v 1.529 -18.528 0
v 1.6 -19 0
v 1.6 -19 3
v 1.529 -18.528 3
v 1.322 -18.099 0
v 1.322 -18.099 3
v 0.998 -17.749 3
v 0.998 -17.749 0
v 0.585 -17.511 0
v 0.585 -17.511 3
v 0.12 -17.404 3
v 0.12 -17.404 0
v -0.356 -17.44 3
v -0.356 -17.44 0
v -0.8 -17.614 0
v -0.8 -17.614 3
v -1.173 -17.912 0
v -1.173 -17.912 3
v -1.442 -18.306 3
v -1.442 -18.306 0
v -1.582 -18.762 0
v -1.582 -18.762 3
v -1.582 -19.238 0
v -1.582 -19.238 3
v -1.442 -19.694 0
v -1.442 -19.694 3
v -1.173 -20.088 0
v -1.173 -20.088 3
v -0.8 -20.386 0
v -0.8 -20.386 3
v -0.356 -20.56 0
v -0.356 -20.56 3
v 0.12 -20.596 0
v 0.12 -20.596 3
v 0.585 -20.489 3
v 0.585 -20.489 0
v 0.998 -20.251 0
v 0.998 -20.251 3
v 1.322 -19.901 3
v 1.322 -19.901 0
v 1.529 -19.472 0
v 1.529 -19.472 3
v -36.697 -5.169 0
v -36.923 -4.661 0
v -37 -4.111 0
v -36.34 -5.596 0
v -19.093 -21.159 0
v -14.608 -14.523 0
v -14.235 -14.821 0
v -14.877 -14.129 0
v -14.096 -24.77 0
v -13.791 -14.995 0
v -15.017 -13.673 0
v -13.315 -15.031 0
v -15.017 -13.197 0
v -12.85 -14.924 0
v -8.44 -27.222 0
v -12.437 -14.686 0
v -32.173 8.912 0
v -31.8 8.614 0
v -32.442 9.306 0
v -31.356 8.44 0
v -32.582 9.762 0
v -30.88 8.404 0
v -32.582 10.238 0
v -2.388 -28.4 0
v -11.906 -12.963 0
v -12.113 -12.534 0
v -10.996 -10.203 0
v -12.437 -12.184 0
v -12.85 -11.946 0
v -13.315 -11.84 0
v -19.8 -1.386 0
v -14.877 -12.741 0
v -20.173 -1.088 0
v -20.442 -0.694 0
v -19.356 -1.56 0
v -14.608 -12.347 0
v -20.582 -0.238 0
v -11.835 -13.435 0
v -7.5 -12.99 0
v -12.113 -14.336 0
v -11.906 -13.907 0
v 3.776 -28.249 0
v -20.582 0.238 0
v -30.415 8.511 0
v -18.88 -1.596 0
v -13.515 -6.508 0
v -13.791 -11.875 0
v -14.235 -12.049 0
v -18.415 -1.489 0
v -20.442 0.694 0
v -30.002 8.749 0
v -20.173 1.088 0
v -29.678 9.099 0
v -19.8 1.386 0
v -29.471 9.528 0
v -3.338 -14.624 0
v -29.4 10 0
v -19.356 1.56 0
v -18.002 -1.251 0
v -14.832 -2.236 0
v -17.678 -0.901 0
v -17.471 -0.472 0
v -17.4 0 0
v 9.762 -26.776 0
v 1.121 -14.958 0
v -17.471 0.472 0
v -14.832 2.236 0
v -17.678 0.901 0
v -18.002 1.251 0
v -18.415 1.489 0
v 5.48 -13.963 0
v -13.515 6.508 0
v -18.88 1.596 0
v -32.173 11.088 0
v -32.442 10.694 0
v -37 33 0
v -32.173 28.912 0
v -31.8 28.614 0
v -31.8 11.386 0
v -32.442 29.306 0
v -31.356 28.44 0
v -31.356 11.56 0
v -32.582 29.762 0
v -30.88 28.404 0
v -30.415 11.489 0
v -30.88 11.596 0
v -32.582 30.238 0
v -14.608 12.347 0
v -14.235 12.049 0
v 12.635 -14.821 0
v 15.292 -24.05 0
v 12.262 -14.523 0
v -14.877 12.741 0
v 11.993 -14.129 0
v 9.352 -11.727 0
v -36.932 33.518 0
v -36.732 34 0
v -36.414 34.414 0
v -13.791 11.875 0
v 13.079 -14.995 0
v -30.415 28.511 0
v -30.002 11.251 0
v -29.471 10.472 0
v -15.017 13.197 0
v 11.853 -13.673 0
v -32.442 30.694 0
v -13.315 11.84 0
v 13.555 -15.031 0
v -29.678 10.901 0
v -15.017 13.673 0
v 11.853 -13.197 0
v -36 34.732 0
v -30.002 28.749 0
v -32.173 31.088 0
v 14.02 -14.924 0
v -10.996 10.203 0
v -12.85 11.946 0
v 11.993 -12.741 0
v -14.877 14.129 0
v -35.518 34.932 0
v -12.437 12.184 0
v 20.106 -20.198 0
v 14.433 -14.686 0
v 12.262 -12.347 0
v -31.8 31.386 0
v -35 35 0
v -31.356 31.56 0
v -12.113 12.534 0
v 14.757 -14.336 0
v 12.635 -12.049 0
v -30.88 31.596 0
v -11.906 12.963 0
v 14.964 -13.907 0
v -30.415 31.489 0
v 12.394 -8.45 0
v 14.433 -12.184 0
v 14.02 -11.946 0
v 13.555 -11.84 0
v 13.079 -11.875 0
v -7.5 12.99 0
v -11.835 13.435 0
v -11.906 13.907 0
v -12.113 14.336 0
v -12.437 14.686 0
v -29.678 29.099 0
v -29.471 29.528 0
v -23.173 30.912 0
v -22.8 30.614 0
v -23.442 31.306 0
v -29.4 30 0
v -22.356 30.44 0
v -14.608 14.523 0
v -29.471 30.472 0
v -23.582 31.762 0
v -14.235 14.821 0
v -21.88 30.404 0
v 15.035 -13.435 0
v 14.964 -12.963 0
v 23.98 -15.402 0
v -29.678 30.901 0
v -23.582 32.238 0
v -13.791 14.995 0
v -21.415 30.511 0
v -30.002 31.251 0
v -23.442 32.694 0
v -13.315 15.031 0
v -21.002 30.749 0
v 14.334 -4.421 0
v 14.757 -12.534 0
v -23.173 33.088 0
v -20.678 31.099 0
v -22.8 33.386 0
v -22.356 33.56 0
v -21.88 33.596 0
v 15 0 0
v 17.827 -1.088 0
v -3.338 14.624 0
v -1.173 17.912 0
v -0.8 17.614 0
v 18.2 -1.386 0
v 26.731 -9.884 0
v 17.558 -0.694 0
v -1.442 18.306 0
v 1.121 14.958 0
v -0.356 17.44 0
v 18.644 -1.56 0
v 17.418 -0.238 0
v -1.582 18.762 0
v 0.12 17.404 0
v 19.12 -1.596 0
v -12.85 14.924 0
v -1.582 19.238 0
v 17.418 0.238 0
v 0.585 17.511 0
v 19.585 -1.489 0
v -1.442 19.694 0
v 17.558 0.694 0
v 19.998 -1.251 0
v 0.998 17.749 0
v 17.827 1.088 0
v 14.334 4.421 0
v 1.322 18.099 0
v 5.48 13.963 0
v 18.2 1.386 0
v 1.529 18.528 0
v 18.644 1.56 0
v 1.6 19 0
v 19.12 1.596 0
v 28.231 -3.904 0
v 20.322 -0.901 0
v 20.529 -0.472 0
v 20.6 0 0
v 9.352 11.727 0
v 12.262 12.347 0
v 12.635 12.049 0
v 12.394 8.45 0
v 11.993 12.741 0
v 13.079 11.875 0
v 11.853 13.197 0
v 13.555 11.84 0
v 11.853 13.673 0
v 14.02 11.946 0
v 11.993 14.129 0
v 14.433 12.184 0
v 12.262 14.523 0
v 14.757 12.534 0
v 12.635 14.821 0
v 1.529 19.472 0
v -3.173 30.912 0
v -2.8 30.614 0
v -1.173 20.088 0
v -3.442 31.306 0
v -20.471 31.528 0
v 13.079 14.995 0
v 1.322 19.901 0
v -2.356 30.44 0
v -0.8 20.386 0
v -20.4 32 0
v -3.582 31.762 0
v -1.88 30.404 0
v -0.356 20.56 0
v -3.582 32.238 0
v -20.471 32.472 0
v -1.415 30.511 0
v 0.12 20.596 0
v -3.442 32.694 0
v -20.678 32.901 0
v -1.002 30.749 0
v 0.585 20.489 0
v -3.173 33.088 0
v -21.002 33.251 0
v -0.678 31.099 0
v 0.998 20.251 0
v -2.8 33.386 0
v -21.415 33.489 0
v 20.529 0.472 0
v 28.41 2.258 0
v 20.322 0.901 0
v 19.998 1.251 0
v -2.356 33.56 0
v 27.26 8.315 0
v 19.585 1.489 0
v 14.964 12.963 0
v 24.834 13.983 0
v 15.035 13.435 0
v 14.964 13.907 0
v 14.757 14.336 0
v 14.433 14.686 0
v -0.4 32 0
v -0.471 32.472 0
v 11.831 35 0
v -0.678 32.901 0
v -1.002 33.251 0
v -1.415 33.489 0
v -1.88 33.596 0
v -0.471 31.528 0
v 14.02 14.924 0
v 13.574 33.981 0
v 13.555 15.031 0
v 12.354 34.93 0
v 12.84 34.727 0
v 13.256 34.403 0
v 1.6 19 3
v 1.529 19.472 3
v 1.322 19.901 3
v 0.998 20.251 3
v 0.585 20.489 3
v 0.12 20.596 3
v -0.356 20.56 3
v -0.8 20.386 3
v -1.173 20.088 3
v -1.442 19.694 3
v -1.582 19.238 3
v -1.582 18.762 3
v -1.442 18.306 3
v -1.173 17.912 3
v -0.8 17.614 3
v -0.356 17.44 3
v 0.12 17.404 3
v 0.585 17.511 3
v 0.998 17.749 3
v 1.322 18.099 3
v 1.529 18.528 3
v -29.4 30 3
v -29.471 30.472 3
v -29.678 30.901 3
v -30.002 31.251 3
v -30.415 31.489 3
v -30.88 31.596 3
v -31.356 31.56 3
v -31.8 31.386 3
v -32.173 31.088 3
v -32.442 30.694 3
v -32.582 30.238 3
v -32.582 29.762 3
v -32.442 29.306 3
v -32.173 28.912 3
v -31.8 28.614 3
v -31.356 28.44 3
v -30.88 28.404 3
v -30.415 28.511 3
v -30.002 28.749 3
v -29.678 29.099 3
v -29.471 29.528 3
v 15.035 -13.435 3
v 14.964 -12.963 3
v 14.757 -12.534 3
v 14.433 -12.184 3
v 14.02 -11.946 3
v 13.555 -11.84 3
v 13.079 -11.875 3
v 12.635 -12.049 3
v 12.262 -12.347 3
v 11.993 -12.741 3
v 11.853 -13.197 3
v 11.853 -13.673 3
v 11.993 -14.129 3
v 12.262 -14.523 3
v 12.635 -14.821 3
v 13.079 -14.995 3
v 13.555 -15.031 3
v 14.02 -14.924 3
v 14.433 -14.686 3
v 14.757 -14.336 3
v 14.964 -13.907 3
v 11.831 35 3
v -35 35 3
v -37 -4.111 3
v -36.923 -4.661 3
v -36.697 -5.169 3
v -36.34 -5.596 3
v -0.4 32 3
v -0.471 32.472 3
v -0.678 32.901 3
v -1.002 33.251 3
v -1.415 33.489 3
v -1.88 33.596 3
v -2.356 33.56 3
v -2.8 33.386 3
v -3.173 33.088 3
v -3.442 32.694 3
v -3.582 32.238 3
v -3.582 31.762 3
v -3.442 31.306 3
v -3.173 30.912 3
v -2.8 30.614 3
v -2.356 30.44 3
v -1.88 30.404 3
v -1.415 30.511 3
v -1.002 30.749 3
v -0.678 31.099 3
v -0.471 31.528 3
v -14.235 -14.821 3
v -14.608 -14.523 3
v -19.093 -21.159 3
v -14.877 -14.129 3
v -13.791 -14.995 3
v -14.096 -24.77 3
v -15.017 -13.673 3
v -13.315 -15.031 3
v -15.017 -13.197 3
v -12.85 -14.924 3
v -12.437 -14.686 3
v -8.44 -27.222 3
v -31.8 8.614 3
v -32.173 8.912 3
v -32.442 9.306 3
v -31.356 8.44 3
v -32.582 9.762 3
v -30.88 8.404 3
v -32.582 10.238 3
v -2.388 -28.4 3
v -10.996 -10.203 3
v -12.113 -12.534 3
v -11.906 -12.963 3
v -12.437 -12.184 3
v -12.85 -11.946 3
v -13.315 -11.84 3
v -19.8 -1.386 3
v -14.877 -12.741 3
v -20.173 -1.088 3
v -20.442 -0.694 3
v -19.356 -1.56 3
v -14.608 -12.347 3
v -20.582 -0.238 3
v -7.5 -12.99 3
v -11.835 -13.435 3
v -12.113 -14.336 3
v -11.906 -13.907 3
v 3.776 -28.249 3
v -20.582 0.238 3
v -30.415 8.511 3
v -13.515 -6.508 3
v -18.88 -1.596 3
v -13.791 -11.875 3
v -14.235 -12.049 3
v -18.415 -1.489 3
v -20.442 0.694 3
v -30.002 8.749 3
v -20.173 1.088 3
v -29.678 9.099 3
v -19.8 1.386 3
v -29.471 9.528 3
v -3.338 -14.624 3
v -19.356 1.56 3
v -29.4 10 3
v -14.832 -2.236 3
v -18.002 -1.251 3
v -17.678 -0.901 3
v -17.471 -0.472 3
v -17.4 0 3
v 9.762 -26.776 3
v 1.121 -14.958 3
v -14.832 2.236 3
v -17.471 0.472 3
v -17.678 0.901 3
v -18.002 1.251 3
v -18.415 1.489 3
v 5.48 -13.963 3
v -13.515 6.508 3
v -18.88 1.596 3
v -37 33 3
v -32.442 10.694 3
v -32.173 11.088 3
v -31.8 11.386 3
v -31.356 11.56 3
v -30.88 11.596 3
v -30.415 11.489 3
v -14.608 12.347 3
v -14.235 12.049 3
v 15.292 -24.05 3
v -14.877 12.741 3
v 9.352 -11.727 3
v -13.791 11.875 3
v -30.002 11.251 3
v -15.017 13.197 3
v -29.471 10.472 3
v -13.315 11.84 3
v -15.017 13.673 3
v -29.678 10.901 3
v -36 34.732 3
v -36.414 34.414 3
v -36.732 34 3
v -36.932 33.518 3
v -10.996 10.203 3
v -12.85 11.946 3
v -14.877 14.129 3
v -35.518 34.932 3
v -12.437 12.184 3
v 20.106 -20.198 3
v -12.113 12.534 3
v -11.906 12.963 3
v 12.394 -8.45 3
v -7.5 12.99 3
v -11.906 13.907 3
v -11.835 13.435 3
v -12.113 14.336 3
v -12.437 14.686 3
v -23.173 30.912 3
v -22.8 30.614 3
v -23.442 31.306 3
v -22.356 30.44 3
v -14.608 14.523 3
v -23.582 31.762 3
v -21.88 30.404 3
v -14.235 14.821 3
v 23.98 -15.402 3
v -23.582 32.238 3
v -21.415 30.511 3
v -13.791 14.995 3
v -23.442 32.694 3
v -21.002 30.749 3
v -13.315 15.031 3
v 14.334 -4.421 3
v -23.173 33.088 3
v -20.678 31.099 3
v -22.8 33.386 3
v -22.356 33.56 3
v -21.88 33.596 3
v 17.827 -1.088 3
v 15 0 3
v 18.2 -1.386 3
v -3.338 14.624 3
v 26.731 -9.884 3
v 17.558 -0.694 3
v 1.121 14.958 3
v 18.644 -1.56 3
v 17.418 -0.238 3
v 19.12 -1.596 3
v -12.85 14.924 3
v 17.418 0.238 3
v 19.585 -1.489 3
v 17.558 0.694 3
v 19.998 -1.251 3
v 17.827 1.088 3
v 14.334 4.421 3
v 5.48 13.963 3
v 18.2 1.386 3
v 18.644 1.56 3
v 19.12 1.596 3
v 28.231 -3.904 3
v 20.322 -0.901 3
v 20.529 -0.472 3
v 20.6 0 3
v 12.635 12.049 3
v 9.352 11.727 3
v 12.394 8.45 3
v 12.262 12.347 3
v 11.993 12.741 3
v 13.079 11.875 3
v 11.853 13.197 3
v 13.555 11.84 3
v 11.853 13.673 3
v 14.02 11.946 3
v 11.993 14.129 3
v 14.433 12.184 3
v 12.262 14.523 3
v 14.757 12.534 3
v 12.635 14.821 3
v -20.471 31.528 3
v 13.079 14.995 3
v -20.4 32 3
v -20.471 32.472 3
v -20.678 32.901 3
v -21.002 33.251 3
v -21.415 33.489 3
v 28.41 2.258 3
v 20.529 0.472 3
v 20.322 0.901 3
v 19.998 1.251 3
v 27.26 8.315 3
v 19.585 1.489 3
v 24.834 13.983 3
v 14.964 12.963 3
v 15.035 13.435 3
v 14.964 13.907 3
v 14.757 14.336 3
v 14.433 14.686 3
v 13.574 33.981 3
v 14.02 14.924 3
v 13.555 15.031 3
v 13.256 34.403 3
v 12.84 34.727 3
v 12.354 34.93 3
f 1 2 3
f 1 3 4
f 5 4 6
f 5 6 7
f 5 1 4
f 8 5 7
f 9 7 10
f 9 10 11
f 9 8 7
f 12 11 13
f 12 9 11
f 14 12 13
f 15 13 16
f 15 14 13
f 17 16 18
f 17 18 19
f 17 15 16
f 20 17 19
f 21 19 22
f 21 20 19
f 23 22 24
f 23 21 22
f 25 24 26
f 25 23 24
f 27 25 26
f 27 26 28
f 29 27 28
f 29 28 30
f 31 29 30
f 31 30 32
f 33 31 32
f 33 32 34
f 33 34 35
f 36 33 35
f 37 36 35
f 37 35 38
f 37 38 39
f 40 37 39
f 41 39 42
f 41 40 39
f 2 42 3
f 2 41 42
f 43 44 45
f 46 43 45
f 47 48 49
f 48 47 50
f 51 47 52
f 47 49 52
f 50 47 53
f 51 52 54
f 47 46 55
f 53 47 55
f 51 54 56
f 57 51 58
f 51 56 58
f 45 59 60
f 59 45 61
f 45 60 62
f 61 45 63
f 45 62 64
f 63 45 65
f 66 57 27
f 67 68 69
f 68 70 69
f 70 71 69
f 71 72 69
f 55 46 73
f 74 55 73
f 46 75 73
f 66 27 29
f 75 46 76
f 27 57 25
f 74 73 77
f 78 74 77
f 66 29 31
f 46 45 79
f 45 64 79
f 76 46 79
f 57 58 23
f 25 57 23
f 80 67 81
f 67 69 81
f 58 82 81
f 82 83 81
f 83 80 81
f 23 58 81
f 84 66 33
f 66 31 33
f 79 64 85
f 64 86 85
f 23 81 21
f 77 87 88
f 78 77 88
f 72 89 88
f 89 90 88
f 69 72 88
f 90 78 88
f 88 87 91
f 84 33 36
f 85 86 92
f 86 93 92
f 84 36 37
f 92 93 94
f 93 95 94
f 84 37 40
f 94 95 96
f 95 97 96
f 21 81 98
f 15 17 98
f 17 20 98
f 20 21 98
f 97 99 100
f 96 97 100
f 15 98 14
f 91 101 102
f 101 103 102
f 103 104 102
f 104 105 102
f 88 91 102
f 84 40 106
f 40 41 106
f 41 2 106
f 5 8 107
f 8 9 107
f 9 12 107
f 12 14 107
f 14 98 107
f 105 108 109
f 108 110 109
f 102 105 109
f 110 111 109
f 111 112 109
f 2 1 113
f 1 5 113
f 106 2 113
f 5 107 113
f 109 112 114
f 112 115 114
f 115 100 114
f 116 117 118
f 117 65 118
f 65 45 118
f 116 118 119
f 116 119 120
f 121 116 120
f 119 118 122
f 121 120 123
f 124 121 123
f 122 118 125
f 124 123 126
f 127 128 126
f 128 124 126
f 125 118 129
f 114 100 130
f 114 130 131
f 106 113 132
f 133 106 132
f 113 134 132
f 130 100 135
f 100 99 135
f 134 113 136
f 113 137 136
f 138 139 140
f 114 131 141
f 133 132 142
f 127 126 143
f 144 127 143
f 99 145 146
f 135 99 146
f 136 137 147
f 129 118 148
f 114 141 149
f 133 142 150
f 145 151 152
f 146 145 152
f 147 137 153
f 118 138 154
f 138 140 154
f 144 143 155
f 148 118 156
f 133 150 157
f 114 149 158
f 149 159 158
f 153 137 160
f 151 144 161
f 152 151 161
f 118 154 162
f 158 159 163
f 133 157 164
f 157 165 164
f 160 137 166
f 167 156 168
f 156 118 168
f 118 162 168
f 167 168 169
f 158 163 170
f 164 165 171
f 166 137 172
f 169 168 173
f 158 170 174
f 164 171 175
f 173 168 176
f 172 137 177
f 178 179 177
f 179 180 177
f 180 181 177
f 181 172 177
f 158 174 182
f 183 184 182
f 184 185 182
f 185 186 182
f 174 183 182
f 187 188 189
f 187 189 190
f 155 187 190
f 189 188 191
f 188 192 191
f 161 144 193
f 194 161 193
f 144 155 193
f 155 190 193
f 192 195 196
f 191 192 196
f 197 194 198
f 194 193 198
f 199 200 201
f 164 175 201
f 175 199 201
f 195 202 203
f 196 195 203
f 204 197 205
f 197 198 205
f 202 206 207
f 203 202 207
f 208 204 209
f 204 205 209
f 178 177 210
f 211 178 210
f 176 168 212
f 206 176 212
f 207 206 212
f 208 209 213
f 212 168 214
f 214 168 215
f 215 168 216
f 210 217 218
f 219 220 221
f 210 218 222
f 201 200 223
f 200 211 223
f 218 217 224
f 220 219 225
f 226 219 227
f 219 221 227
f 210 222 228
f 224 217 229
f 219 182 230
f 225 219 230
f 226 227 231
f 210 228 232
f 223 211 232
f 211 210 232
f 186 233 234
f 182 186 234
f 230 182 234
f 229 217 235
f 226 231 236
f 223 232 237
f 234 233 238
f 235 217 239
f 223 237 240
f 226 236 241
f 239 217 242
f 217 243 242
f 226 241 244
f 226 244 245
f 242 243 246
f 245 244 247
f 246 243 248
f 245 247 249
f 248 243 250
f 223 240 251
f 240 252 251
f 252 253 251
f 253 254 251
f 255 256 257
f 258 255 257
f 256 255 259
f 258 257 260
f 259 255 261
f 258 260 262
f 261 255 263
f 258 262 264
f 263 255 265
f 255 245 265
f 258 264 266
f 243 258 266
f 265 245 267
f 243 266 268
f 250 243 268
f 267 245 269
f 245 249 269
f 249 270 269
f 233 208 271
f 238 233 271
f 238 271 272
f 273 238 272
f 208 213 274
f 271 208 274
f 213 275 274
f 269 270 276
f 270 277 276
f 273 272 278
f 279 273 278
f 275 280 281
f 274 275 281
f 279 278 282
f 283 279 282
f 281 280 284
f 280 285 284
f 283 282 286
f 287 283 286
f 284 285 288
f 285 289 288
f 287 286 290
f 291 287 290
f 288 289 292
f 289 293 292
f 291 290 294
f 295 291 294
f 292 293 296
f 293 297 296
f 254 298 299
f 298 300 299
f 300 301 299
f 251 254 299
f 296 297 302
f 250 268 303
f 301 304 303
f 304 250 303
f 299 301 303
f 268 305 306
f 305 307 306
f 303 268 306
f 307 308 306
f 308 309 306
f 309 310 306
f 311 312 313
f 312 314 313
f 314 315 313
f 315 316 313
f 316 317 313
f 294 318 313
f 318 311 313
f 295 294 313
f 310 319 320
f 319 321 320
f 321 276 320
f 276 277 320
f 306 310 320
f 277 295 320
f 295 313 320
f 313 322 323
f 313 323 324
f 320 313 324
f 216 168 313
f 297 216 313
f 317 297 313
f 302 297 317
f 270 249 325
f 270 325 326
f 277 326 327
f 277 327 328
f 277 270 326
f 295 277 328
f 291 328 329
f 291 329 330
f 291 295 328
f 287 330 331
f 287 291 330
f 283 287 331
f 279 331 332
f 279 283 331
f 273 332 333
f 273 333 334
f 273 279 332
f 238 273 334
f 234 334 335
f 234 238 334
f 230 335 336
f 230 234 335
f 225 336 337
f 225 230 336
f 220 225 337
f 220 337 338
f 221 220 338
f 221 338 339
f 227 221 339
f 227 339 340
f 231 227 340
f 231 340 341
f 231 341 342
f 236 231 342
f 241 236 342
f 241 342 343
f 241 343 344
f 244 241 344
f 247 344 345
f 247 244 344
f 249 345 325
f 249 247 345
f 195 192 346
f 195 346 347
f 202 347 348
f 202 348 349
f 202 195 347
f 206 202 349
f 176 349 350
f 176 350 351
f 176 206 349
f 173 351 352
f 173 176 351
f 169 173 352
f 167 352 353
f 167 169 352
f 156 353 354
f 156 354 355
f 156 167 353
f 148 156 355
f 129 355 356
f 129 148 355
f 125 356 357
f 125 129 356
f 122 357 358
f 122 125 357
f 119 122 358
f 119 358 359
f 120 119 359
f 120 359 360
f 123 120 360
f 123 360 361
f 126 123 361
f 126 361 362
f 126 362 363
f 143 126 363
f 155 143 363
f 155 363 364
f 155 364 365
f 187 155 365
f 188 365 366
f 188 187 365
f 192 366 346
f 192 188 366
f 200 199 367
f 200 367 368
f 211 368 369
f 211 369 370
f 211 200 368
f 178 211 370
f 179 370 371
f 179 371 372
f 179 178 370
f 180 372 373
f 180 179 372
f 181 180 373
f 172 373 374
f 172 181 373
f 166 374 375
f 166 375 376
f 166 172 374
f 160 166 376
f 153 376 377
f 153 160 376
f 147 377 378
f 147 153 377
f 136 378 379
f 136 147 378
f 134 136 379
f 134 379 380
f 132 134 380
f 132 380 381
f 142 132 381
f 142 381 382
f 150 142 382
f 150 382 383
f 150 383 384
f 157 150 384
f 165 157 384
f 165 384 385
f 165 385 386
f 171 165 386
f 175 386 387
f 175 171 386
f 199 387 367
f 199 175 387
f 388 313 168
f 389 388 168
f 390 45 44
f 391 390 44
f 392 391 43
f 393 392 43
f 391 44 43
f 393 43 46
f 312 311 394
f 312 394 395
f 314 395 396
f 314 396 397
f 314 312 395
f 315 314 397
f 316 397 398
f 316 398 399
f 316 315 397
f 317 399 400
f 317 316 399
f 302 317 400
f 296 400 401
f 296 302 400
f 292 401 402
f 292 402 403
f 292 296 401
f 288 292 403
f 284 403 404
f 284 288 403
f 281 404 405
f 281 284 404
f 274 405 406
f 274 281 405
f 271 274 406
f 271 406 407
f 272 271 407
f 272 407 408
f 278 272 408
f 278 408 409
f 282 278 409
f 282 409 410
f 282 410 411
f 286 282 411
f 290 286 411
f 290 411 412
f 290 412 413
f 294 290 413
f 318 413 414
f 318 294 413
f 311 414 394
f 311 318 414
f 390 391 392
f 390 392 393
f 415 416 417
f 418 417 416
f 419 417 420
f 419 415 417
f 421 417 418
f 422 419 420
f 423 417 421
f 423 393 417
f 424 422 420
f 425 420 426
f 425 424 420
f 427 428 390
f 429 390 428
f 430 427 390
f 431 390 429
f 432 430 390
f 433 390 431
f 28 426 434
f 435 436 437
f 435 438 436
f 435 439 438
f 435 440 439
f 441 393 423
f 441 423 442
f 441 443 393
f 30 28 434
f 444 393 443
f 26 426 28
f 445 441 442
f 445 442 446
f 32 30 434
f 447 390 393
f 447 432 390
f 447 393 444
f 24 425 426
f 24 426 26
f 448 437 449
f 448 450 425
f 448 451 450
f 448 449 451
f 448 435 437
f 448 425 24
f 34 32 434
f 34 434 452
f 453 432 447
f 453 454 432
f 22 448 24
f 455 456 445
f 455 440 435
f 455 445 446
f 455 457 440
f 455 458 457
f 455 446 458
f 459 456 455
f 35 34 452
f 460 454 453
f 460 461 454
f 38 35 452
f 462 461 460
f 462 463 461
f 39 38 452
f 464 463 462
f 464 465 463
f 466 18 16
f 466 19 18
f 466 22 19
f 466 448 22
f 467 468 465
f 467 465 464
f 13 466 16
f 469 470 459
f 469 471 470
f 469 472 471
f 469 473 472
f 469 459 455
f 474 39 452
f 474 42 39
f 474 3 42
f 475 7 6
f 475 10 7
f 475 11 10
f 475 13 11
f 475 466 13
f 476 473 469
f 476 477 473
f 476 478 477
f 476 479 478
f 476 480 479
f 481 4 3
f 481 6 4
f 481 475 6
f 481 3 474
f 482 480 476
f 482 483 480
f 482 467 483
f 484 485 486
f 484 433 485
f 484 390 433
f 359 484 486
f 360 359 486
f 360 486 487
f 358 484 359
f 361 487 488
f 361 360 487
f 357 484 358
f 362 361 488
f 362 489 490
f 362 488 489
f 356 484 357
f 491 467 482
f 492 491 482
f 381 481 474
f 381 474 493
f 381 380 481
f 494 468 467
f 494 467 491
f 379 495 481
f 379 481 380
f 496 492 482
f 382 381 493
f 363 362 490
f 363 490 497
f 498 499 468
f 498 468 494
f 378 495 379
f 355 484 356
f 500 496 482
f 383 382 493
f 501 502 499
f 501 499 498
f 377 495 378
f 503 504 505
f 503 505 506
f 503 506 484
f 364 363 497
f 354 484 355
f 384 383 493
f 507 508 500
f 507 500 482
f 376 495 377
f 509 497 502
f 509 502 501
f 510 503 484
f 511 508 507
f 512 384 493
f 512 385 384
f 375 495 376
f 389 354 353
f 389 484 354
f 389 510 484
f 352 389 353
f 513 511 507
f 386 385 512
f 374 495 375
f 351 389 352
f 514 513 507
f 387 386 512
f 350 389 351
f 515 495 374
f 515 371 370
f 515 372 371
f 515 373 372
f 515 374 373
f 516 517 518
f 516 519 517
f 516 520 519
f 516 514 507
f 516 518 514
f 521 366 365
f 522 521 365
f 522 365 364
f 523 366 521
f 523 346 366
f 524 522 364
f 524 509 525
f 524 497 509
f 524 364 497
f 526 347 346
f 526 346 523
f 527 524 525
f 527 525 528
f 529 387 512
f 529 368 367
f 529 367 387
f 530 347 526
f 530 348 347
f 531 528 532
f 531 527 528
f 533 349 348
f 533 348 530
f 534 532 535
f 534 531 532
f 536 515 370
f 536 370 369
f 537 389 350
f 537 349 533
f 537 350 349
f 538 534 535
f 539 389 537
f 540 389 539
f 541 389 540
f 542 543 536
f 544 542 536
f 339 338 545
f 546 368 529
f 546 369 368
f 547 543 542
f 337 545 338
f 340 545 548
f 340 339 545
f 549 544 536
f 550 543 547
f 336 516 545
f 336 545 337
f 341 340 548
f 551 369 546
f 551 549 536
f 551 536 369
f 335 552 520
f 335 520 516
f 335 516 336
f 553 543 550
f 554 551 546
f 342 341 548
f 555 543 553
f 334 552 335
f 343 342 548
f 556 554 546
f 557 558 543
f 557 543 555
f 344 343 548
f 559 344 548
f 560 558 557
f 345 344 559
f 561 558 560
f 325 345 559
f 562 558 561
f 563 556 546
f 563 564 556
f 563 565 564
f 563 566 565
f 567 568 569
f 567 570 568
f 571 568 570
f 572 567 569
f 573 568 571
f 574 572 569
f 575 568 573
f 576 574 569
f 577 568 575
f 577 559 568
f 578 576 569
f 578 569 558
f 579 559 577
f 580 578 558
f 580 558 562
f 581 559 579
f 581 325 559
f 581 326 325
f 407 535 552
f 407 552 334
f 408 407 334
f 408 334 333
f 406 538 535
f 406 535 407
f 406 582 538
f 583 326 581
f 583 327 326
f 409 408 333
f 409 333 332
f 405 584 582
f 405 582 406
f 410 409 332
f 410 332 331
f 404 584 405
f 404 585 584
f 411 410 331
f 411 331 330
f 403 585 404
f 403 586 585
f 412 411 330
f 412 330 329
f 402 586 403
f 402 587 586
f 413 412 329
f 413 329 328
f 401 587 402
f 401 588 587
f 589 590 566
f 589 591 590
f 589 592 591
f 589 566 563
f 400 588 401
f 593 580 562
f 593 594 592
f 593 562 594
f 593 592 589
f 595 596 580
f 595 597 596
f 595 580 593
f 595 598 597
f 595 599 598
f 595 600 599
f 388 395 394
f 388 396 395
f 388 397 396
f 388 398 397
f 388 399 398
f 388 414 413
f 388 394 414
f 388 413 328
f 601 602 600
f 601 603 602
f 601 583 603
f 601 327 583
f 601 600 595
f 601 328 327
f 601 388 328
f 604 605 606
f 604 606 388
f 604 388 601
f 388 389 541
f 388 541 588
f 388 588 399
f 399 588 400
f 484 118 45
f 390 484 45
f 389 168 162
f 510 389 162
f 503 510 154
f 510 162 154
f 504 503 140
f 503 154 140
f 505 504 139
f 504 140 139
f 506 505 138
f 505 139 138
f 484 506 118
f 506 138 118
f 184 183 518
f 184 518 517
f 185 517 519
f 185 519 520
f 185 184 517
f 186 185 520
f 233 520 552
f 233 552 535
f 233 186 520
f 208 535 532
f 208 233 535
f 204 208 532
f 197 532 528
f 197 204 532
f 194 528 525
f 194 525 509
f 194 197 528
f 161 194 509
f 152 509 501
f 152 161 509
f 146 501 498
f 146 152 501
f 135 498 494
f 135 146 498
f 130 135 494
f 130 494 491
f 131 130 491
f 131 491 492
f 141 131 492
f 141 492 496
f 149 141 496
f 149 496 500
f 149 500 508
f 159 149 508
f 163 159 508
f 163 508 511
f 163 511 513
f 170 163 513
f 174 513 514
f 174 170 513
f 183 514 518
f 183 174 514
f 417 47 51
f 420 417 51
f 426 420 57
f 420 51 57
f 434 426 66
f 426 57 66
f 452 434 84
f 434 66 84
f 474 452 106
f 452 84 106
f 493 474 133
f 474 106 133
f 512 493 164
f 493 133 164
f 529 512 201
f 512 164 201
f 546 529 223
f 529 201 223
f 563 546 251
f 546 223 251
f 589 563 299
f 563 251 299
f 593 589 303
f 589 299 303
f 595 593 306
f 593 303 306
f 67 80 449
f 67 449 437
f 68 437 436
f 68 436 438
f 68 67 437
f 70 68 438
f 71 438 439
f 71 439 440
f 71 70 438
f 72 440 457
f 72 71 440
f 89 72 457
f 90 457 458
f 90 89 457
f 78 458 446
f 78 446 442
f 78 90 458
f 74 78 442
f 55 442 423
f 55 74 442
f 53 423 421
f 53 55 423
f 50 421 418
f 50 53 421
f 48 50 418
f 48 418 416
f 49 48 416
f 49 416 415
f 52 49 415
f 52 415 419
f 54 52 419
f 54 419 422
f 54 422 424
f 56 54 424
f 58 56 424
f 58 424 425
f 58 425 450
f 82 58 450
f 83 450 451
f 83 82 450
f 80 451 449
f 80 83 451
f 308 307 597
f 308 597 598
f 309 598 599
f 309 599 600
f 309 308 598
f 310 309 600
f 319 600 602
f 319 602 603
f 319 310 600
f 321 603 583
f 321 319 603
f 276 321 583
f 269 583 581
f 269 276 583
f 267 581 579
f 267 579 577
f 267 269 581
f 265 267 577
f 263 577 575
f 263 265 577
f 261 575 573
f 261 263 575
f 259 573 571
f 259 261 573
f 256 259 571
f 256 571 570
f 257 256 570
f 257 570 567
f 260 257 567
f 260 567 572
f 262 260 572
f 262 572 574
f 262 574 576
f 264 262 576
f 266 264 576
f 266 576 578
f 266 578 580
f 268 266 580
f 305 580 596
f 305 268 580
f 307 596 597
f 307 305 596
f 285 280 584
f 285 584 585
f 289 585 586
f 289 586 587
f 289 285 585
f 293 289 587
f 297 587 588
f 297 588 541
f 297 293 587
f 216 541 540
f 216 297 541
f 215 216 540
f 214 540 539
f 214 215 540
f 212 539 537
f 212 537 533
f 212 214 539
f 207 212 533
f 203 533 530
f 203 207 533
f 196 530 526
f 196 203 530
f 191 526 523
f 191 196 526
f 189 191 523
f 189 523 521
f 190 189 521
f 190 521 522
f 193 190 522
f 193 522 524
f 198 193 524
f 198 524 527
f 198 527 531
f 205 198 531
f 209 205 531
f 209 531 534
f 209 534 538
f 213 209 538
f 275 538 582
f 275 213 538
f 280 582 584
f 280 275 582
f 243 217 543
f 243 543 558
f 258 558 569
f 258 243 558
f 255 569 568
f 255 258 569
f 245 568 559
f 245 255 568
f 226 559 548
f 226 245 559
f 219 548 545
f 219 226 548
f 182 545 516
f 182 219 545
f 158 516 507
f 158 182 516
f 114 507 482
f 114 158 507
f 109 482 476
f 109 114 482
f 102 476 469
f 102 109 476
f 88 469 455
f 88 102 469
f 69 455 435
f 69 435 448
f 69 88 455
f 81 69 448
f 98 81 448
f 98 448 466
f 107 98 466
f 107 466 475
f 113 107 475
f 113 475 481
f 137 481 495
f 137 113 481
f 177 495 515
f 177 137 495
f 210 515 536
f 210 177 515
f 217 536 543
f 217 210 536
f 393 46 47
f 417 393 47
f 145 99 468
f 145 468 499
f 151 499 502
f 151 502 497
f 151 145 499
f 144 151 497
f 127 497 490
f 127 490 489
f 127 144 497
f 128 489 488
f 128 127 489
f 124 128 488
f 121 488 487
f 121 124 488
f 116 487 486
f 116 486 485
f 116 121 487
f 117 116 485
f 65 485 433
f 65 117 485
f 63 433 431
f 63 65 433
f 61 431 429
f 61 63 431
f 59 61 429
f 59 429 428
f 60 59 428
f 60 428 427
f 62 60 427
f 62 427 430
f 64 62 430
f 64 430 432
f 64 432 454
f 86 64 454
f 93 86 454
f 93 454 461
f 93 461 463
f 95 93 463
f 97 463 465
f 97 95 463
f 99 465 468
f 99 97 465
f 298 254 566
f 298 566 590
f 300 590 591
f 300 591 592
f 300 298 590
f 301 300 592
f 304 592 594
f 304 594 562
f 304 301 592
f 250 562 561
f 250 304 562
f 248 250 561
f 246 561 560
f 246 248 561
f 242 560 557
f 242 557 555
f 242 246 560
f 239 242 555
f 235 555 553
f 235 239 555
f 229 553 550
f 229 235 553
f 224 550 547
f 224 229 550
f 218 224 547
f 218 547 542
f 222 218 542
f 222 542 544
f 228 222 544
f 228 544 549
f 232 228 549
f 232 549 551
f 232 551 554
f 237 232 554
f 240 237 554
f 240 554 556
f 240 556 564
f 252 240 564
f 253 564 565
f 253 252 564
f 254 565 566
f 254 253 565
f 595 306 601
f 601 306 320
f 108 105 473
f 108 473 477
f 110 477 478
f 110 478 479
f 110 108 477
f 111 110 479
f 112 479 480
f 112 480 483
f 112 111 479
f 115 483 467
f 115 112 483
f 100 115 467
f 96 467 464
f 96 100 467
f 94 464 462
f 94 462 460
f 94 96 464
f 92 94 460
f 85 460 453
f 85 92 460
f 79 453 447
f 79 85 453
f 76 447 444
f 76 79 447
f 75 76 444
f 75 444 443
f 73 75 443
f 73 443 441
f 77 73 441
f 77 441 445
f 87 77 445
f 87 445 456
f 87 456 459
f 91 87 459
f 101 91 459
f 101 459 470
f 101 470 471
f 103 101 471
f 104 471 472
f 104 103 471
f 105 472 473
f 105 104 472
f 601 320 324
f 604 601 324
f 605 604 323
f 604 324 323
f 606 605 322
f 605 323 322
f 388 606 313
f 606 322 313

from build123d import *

# Parameters (mm, degrees)
SKETCH_2_R      = 28.5
SKETCH_2_R_2    = 15
SKETCH_2_R_3    = 1.6
EXTRUDE_1_DEPTH = 3
EXTRUDE_START   = -3
SKETCH_4_R      = 1.6
EXTRUDE_2_DEPTH = 3


with BuildPart() as part:
    # 草图2 → 凸台-拉伸1 (new body)
    with BuildSketch(Plane.XY):
        Circle(SKETCH_2_R)
        Circle(SKETCH_2_R_2, mode=Mode.SUBTRACT)
        with Locations((0, 19)):
            Circle(SKETCH_2_R_3, mode=Mode.SUBTRACT)
        with Locations((13.435028843, 13.435028843)):
            Circle(SKETCH_2_R_3, mode=Mode.SUBTRACT)
        with Locations((19, 0)):
            Circle(SKETCH_2_R_3, mode=Mode.SUBTRACT)
        with Locations((13.435028843, -13.435028843)):
            Circle(SKETCH_2_R_3, mode=Mode.SUBTRACT)
        with Locations((0, -19)):
            Circle(SKETCH_2_R_3, mode=Mode.SUBTRACT)
        with Locations((-13.435028843, -13.435028843)):
            Circle(SKETCH_2_R_3, mode=Mode.SUBTRACT)
        with Locations((-19, 0)):
            Circle(SKETCH_2_R_3, mode=Mode.SUBTRACT)
        with Locations((-13.435028843, 13.435028843)):
            Circle(SKETCH_2_R_3, mode=Mode.SUBTRACT)
    extrude(amount=EXTRUDE_1_DEPTH)

    # 草图4 → 凸台-拉伸2 (add)
    with BuildSketch(Plane.XY.offset(3).offset(EXTRUDE_START)):
        with BuildLine():
            Line((-36.339888851, -5.595677643), (-19.093416125, -21.158720677))
            ThreePointArc((-19.093416125, -21.158720677), (-17.803808855, 22.254761069), (24.833892005, 13.983125827))
            Line((24.833892005, 13.983125827), (13.573611336, 33.981271988))
            ThreePointArc((13.573611336, 33.981271988), (12.840202642, 34.726636032), (11.830882073, 35))
            Line((11.830882073, 35), (-35, 35))
            ThreePointArc((-35, 35), (-36.414213562, 34.414213562), (-37, 33))
            Line((-37, 33), (-37, -4.110855139))
            ThreePointArc((-37, -4.110855139), (-36.827536279, -4.923327384), (-36.339888851, -5.595677643))
        make_face()
        with Locations((-31, 30)):
            Circle(SKETCH_4_R, mode=Mode.SUBTRACT)
        with Locations((-31, 10)):
            Circle(SKETCH_4_R, mode=Mode.SUBTRACT)
        with Locations((-22, 32)):
            Circle(SKETCH_4_R, mode=Mode.SUBTRACT)
        with Locations((-2, 32)):
            Circle(SKETCH_4_R, mode=Mode.SUBTRACT)
    extrude(amount=EXTRUDE_2_DEPTH)


solid = part.part
